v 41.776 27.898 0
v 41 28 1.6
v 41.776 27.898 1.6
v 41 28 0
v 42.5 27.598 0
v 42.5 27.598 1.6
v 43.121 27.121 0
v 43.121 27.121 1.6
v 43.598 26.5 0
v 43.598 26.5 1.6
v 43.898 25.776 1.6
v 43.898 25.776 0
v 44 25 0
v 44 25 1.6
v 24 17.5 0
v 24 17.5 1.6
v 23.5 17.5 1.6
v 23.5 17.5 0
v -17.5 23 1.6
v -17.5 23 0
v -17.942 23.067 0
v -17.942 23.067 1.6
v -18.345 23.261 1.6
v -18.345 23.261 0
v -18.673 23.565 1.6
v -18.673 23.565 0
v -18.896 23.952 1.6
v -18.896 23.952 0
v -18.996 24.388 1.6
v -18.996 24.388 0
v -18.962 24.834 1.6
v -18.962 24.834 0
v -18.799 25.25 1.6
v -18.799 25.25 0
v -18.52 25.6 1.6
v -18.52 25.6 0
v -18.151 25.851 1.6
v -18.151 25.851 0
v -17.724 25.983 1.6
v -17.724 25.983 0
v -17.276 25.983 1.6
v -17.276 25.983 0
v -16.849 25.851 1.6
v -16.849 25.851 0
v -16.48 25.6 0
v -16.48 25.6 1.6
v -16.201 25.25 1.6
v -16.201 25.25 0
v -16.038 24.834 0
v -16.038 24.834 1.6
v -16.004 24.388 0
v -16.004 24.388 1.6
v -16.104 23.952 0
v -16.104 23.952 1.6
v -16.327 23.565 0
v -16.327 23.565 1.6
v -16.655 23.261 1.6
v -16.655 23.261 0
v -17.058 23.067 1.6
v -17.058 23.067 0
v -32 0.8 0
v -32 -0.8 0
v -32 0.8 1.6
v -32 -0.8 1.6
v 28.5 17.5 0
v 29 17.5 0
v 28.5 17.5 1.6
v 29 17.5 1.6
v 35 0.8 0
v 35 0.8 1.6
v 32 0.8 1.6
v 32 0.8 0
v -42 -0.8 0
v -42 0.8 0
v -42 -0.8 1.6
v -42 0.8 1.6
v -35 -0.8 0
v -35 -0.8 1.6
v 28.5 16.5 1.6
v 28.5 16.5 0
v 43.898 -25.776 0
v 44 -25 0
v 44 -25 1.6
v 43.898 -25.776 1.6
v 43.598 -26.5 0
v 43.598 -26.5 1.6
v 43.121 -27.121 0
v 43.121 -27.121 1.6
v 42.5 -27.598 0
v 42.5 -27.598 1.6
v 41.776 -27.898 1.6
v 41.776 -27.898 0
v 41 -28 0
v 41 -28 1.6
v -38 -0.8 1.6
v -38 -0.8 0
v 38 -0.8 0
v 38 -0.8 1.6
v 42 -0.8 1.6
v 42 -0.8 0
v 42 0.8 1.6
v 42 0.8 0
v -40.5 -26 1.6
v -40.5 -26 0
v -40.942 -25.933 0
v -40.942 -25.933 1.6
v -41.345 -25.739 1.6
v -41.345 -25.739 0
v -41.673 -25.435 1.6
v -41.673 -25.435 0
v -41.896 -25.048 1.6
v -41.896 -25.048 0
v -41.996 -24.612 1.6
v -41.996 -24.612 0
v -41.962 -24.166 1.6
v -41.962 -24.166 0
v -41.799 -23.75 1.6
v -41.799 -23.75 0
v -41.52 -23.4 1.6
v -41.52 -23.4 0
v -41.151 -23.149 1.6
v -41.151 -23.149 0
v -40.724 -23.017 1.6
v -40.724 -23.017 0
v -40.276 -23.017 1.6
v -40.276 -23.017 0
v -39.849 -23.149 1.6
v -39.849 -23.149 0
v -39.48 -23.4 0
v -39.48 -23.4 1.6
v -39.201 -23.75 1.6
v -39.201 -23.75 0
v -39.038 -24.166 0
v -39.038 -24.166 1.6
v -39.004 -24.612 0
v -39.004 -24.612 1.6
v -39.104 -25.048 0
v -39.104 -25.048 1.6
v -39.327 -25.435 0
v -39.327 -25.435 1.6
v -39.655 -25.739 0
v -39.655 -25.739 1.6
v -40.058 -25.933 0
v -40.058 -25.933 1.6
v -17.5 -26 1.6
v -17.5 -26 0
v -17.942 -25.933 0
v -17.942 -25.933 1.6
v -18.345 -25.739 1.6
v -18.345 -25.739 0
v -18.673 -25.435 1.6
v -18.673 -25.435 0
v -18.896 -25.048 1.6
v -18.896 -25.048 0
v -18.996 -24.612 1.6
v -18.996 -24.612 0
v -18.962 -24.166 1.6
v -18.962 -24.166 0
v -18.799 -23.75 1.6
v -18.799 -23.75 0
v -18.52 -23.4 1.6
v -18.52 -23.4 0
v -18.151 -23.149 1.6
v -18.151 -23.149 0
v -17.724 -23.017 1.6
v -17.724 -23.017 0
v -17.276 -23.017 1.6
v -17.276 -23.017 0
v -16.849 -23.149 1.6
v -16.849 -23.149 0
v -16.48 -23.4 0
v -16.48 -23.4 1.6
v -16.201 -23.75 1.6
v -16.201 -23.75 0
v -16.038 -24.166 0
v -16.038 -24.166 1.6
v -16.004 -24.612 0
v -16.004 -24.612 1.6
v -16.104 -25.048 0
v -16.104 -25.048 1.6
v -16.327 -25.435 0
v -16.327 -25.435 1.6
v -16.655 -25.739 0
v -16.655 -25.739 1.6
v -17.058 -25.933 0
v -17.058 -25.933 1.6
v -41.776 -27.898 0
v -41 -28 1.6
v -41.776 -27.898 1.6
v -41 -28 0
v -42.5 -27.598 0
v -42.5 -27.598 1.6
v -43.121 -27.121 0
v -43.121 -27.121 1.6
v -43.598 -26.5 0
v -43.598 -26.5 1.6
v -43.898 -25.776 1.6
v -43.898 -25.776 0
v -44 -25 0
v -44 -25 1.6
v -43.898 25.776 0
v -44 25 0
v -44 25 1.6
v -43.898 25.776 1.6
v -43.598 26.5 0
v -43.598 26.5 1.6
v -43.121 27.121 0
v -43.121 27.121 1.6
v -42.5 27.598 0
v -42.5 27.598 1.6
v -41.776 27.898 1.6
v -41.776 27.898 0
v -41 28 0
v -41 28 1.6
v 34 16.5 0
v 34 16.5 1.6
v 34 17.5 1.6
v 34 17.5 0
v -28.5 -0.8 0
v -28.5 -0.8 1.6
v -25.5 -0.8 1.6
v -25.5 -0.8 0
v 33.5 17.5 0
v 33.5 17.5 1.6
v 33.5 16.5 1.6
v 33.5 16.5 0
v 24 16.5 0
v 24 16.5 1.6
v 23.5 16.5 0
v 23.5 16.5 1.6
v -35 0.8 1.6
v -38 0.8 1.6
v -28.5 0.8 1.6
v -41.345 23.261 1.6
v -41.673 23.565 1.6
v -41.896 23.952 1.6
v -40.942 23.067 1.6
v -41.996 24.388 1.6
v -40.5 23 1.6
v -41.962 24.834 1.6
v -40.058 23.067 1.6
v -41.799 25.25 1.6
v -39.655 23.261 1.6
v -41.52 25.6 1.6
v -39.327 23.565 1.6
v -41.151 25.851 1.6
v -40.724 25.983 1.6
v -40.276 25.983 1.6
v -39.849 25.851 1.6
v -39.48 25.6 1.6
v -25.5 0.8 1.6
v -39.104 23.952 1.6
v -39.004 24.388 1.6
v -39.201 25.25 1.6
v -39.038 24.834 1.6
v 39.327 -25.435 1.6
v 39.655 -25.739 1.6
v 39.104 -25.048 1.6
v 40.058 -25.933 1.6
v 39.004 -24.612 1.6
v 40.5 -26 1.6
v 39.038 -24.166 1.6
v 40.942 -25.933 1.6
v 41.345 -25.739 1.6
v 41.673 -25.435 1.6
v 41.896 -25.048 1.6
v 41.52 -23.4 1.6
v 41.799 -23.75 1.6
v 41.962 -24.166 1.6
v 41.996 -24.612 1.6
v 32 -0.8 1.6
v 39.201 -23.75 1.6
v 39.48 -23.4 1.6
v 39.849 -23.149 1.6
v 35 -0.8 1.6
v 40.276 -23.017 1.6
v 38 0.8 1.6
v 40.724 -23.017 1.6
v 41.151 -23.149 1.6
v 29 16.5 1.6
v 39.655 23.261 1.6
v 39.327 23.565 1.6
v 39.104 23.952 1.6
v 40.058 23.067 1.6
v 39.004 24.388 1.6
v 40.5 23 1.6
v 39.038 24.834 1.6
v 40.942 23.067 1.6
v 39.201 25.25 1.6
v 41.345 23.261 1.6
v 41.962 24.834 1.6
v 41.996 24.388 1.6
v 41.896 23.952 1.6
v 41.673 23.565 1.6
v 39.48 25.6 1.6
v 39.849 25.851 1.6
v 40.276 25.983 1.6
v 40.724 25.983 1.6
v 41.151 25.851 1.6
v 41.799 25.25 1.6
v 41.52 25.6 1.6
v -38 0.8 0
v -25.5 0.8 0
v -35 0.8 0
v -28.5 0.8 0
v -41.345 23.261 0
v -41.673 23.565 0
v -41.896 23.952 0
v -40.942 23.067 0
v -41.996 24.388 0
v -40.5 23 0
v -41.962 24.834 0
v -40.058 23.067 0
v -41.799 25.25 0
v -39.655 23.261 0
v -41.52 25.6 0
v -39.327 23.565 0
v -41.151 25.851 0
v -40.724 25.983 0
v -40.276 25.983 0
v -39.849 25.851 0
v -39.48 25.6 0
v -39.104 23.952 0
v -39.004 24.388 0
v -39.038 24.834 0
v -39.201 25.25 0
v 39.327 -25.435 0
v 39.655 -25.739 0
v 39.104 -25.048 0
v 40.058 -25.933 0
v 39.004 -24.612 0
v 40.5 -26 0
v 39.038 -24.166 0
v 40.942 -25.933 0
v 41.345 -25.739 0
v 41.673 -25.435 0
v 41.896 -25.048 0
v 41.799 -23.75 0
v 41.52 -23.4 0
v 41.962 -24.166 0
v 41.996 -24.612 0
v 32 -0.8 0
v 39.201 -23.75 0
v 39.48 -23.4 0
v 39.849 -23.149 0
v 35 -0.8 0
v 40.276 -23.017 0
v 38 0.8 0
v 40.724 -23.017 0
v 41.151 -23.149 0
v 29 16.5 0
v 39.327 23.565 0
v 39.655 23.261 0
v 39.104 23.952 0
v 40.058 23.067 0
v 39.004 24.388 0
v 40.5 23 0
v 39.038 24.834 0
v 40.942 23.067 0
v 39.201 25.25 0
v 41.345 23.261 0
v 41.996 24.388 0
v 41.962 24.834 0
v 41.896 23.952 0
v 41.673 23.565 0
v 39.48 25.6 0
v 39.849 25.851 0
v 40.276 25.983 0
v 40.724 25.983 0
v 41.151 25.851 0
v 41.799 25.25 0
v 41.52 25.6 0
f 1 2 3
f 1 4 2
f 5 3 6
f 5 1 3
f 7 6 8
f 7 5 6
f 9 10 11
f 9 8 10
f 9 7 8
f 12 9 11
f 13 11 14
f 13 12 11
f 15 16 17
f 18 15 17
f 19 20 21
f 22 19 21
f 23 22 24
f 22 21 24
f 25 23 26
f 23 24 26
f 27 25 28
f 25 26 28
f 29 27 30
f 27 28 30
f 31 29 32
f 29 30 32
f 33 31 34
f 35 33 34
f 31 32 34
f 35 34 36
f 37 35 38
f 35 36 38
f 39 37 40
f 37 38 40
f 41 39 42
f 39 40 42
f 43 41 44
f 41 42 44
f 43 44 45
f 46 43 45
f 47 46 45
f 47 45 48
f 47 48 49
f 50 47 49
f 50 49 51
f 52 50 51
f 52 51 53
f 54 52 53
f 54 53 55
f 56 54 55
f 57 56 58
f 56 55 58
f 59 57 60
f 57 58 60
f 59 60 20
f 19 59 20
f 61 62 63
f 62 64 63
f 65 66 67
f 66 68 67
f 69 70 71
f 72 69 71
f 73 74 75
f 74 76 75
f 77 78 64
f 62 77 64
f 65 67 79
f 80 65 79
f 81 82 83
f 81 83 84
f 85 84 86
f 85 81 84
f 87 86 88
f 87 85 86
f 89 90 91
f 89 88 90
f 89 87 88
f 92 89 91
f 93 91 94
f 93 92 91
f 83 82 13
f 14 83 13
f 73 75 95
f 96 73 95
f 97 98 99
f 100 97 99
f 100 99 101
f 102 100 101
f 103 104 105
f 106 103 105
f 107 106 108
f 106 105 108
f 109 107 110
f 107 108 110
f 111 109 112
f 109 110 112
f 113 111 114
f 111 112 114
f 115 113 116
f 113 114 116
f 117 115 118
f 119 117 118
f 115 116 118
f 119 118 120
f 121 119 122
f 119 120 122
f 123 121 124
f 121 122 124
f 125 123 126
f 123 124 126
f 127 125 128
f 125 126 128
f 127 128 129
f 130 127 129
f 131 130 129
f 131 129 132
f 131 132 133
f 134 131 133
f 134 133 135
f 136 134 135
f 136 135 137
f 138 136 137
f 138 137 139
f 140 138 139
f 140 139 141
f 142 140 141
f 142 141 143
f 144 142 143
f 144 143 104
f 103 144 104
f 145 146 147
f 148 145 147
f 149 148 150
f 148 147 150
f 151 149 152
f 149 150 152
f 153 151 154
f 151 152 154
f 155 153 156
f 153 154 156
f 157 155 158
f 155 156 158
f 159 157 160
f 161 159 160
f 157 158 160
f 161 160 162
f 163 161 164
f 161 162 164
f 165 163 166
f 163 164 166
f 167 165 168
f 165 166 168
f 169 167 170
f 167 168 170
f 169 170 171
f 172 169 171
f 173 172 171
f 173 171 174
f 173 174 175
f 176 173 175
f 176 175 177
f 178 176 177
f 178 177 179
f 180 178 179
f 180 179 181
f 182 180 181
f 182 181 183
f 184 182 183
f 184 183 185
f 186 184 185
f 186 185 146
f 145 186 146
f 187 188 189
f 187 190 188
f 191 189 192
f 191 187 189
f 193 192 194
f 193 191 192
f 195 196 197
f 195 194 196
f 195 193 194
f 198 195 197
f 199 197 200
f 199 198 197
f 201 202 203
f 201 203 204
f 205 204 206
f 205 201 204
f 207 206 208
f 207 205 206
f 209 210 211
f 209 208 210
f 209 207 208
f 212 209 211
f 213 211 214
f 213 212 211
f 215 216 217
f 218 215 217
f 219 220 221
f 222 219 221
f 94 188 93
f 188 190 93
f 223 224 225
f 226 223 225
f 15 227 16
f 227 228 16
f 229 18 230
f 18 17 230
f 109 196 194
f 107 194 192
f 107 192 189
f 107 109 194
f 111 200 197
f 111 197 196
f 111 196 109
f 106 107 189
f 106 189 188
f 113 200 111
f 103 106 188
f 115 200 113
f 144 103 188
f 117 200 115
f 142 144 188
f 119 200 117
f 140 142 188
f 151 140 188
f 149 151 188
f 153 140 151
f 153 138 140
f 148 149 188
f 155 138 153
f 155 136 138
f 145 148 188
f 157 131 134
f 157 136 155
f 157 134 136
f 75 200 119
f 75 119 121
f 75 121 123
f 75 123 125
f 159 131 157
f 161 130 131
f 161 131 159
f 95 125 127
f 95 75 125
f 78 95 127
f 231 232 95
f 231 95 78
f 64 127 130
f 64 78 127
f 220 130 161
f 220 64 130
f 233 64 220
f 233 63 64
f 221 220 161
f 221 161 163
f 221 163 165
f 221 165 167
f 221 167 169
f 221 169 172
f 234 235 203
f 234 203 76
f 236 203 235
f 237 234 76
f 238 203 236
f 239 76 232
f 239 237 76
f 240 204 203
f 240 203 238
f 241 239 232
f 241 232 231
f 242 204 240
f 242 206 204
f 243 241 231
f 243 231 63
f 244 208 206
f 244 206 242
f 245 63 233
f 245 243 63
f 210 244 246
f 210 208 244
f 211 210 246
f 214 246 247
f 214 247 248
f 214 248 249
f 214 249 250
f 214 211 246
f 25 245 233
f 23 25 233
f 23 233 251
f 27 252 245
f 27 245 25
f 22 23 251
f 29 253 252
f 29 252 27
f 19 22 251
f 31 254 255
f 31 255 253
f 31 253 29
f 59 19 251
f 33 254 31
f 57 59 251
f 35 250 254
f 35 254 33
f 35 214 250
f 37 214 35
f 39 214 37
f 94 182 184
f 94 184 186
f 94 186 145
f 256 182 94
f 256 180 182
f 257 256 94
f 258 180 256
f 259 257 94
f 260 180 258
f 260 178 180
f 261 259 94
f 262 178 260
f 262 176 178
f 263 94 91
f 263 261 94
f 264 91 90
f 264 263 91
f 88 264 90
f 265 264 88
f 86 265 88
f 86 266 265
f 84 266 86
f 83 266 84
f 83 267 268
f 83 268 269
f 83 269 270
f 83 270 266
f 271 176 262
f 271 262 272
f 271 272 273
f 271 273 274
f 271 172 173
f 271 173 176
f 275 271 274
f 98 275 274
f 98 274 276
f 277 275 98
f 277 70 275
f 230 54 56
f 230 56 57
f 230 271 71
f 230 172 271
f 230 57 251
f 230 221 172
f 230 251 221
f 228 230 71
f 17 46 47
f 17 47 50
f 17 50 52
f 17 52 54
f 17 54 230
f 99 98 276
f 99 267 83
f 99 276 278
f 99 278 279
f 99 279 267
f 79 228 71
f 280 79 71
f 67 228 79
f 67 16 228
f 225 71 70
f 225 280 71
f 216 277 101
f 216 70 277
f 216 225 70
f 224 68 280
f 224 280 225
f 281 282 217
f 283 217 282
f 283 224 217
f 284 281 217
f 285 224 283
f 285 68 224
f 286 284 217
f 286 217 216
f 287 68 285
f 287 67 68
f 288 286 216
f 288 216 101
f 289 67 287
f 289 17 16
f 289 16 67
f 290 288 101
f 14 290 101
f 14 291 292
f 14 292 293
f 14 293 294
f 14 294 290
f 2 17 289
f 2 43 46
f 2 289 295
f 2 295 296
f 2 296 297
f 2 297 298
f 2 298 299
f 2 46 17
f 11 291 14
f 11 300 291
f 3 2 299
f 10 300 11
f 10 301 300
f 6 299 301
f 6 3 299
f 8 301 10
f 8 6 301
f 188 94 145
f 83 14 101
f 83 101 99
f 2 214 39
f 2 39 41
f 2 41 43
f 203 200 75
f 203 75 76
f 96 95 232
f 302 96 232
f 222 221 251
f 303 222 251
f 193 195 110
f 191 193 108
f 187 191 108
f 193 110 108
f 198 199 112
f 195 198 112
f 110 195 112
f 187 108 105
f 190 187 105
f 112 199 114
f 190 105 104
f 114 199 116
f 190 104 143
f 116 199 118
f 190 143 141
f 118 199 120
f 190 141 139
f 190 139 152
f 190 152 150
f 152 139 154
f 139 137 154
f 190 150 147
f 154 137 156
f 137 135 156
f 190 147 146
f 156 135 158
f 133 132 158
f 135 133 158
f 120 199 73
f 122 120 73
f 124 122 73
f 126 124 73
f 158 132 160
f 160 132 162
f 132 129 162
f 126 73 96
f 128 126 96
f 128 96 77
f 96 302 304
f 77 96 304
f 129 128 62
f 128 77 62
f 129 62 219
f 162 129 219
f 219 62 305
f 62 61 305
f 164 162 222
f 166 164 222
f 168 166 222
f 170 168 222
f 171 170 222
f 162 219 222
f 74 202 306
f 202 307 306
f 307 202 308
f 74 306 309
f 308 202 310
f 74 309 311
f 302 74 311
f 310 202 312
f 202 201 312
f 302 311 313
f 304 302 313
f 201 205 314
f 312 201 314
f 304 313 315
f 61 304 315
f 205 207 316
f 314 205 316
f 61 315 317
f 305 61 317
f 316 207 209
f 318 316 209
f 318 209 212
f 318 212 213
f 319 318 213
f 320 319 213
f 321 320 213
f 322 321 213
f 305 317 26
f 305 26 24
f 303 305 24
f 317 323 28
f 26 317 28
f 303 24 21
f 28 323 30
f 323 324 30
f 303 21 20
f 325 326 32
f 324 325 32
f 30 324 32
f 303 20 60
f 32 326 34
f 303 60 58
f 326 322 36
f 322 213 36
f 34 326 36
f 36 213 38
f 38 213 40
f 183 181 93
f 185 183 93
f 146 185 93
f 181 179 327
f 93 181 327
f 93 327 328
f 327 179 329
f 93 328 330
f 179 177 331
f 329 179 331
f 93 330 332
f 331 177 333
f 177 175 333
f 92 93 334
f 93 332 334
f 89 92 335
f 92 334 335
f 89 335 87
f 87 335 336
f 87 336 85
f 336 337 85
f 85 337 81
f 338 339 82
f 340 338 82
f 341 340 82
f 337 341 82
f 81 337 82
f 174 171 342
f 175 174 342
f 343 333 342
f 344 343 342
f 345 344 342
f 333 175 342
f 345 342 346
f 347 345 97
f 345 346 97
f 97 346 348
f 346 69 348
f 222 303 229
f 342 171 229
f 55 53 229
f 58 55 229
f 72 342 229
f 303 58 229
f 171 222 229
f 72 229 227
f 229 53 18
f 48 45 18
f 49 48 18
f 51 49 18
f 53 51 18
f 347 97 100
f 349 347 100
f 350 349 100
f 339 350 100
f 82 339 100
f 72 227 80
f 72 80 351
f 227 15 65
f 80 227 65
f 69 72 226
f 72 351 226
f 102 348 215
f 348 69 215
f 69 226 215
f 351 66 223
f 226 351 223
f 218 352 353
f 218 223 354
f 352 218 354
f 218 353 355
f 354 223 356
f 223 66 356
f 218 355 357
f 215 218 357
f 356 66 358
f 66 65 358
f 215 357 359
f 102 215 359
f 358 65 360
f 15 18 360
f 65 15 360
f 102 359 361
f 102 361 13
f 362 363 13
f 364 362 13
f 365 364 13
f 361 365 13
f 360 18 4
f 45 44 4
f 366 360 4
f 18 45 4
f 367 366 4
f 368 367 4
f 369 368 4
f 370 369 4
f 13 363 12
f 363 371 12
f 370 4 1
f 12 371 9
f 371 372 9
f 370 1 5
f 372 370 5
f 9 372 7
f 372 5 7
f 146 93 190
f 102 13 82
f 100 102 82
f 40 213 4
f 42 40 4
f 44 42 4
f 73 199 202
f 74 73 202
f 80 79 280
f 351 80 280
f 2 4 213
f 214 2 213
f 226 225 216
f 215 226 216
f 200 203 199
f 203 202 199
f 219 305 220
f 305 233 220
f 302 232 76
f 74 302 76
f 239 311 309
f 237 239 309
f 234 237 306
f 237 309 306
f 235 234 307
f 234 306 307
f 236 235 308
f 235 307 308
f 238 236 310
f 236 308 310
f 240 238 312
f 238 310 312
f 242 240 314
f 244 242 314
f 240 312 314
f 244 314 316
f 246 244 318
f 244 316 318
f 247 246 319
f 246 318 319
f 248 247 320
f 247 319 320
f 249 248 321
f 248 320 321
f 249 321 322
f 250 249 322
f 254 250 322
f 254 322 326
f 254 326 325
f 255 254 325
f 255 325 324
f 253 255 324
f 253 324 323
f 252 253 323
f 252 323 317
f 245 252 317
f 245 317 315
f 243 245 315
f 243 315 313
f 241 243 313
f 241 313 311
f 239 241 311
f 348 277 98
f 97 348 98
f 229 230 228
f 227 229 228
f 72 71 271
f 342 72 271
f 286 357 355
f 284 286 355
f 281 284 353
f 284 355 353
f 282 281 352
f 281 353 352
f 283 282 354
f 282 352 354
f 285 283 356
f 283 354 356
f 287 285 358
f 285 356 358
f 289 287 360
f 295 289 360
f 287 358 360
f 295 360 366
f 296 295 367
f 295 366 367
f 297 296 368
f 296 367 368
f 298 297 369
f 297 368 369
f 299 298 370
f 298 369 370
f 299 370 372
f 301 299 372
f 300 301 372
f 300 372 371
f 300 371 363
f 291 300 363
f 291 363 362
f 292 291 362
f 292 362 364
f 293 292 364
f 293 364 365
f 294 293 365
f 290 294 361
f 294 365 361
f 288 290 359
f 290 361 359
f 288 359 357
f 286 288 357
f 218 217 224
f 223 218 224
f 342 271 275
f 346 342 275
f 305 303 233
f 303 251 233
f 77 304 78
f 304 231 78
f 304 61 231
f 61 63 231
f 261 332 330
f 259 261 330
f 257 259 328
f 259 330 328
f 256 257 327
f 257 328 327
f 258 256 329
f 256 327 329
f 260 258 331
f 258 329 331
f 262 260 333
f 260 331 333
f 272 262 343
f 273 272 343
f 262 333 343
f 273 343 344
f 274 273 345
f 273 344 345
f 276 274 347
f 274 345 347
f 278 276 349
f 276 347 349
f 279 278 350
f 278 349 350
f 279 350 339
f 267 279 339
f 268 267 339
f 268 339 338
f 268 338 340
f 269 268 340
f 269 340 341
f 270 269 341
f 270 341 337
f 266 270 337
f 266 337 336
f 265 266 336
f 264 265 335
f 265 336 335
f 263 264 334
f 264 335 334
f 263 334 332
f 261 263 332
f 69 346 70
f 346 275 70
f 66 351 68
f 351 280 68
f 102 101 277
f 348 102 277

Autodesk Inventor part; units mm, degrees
ref_plane "YZ Plane" through (0, 0, 0) normal (1, 0, 0) x (0, 1, 0)
ref_plane "XZ Plane" through (0, 0, 0) normal (0, 1, 0) x (-1, 0, 0)
ref_plane "XY Plane" through (0, 0, 0) normal (0, 0, 1) x (1, 0, 0)
sketch "Sketch1" plane through (0, 0, 0) normal (0, 0, 1) x (1, 0, 0)
  line L0 (-41, -28) -> (41, -28)
  line L1 (44, -25) -> (44, 25)
  line L2 (41, 28) -> (-41, 28)
  line L3 (-44, 25) -> (-44, -25)
  line L4 (-44, -28) -> (44, 28) construction
  line L5 (44, -28) -> (-44, 28) construction
  arc A0 (-41, 28) -> (-44, 25) centre (-41, 25) ccw
  arc A1 (44, 25) -> (41, 28) centre (41, 25) ccw
  arc A2 (41, -28) -> (44, -25) centre (41, -25) ccw
  arc A3 (-44, -25) -> (-41, -28) centre (-41, -25) ccw
  point P0 (0, 0)
  dimension "d0" = 88
  dimension "d1" = 56
  dimension "d2" = 3
extrude "Extrusion1" add sketch "Sketch1" along normal blind 1.6
sketch "Sketch2" plane through (0, 0, 1.6) normal (0, 0, 1) x (1, 0, 0)
  line L0 (-42, -0.8) -> (-38, -0.8)
  line L1 (-38, -0.8) -> (-38, 0.8)
  line L2 (-38, 0.8) -> (-42, 0.8)
  line L3 (-42, 0.8) -> (-42, -0.8)
  line L4 (-42, -0.8) -> (-38, 0.8) construction
  line L5 (-38, -0.8) -> (-42, 0.8) construction
  line L6 (-35, -0.8) -> (-32, -0.8)
  line L7 (-32, -0.8) -> (-32, 0.8)
  line L8 (-32, 0.8) -> (-35, 0.8)
  line L9 (-35, 0.8) -> (-35, -0.8)
  line L10 (-35, -0.8) -> (-32, 0.8) construction
  line L11 (-32, -0.8) -> (-35, 0.8) construction
  line L12 (-28.5, -0.8) -> (-25.5, -0.8)
  line L13 (-25.5, -0.8) -> (-25.5, 0.8)
  line L14 (-25.5, 0.8) -> (-28.5, 0.8)
  line L15 (-28.5, 0.8) -> (-28.5, -0.8)
  line L16 (-28.5, -0.8) -> (-25.5, 0.8) construction
  line L17 (-25.5, -0.8) -> (-28.5, 0.8) construction
  line L18 (32, -0.8) -> (35, -0.8)
  line L19 (35, -0.8) -> (35, 0.8)
  line L20 (35, 0.8) -> (32, 0.8)
  line L21 (32, 0.8) -> (32, -0.8)
  line L22 (32, -0.8) -> (35, 0.8) construction
  line L23 (35, -0.8) -> (32, 0.8) construction
  line L24 (38, -0.8) -> (42, -0.8)
  line L25 (42, -0.8) -> (42, 0.8)
  line L26 (42, 0.8) -> (38, 0.8)
  line L27 (38, 0.8) -> (38, -0.8)
  line L28 (38, -0.8) -> (42, 0.8) construction
  line L29 (42, -0.8) -> (38, 0.8) construction
  line L30 (-44, 25) -> (-44, -25) projected
  line L31 (44, -25) -> (44, 25) projected
  point P0 (0, 0)
  point P1 (-40, 0)
  point P2 (-33.5, 0)
  point P3 (-27, 0)
  point P4 (33.5, 0)
  point P5 (40, 0)
  dimension "d5" = 2
  dimension "d6" = 4
  dimension "d7" = 3
  dimension "d8" = 3
  dimension "d9" = 3.5
  dimension "d10" = 2
  dimension "d11" = 4
  dimension "d12" = 3
  dimension "d13" = 3
  dimension "d14" = 1.6
extrude "Extrusion2" cut sketch "Sketch2" against normal blind 1.6
sketch "Sketch3" plane through (0, 0, 1.6) normal (0, 0, 1) x (1, 0, 0)
  line L0 (-40.5, 24.5) -> (-17.5, 24.5)
  line L1 (-17.5, 24.5) -> (-17.5, -24.5)
  line L2 (-17.5, -24.5) -> (-40.5, -24.5)
  line L3 (-40.5, -24.5) -> (-40.5, 24.5)
  line L4 (-17.5, 24.5) -> (40.5, 24.5)
  line L5 (40.5, 24.5) -> (40.5, -24.5)
  line L6 (40.5, -24.5) -> (-17.5, -24.5)
  line L7 (-44, 25) -> (-44, -25) projected
  point P0 (0, 0)
  point P1 (-40.5, 0)
  point P2 (-44, 0)
  dimension "d24" = 58
  dimension "d25" = 23
  dimension "d26" = 49
  dimension "d27" = 3.5
hole "Hole1" at (-40.5, -24.5, 1.6) at (-17.5, -24.5, 1.6) at (40.5, -24.5, 1.6) at (40.5, 24.5, 1.6) at (-17.5, 24.5, 1.6) at (-40.5, 24.5, 1.6) direction (0, 0, -1) diameter 3 end through all
sketch "Sketch4" plane through (0, 0, 1.6) normal (0, 0, 1) x (1, 0, 0)
  line L0 (23.5, 16.5) -> (24, 16.5)
  line L1 (24, 16.5) -> (24, 17.5)
  line L2 (24, 17.5) -> (23.5, 17.5)
  line L3 (23.5, 17.5) -> (23.5, 16.5)
  line L4 (33.5, 16.5) -> (34, 16.5)
  line L5 (34, 16.5) -> (34, 17.5)
  line L6 (34, 17.5) -> (33.5, 17.5)
  line L7 (33.5, 17.5) -> (33.5, 16.5)
  line L8 (28.5, 16.5) -> (29, 16.5)
  line L9 (29, 16.5) -> (29, 17.5)
  line L10 (29, 17.5) -> (28.5, 17.5)
  line L11 (28.5, 17.5) -> (28.5, 16.5)
  line L12 (41, 28) -> (-41, 28) projected
  line L13 (44, -25) -> (44, 25) projected
  point P0 (0, 0)
  point P1 (28.75, 16.5)
  point P2 (23.75, 16.5)
  point P3 (33.75, 16.5)
  point P4 (34, 17)
  dimension "d28" = 0.5
  dimension "d29" = 5
  dimension "d30" = 5
  dimension "d31" = 11.5
  dimension "d32" = 1
  dimension "d33" = 10
extrude "Extrusion3" cut sketch "Sketch4" against normal through all
properties part number "PCB_1"
